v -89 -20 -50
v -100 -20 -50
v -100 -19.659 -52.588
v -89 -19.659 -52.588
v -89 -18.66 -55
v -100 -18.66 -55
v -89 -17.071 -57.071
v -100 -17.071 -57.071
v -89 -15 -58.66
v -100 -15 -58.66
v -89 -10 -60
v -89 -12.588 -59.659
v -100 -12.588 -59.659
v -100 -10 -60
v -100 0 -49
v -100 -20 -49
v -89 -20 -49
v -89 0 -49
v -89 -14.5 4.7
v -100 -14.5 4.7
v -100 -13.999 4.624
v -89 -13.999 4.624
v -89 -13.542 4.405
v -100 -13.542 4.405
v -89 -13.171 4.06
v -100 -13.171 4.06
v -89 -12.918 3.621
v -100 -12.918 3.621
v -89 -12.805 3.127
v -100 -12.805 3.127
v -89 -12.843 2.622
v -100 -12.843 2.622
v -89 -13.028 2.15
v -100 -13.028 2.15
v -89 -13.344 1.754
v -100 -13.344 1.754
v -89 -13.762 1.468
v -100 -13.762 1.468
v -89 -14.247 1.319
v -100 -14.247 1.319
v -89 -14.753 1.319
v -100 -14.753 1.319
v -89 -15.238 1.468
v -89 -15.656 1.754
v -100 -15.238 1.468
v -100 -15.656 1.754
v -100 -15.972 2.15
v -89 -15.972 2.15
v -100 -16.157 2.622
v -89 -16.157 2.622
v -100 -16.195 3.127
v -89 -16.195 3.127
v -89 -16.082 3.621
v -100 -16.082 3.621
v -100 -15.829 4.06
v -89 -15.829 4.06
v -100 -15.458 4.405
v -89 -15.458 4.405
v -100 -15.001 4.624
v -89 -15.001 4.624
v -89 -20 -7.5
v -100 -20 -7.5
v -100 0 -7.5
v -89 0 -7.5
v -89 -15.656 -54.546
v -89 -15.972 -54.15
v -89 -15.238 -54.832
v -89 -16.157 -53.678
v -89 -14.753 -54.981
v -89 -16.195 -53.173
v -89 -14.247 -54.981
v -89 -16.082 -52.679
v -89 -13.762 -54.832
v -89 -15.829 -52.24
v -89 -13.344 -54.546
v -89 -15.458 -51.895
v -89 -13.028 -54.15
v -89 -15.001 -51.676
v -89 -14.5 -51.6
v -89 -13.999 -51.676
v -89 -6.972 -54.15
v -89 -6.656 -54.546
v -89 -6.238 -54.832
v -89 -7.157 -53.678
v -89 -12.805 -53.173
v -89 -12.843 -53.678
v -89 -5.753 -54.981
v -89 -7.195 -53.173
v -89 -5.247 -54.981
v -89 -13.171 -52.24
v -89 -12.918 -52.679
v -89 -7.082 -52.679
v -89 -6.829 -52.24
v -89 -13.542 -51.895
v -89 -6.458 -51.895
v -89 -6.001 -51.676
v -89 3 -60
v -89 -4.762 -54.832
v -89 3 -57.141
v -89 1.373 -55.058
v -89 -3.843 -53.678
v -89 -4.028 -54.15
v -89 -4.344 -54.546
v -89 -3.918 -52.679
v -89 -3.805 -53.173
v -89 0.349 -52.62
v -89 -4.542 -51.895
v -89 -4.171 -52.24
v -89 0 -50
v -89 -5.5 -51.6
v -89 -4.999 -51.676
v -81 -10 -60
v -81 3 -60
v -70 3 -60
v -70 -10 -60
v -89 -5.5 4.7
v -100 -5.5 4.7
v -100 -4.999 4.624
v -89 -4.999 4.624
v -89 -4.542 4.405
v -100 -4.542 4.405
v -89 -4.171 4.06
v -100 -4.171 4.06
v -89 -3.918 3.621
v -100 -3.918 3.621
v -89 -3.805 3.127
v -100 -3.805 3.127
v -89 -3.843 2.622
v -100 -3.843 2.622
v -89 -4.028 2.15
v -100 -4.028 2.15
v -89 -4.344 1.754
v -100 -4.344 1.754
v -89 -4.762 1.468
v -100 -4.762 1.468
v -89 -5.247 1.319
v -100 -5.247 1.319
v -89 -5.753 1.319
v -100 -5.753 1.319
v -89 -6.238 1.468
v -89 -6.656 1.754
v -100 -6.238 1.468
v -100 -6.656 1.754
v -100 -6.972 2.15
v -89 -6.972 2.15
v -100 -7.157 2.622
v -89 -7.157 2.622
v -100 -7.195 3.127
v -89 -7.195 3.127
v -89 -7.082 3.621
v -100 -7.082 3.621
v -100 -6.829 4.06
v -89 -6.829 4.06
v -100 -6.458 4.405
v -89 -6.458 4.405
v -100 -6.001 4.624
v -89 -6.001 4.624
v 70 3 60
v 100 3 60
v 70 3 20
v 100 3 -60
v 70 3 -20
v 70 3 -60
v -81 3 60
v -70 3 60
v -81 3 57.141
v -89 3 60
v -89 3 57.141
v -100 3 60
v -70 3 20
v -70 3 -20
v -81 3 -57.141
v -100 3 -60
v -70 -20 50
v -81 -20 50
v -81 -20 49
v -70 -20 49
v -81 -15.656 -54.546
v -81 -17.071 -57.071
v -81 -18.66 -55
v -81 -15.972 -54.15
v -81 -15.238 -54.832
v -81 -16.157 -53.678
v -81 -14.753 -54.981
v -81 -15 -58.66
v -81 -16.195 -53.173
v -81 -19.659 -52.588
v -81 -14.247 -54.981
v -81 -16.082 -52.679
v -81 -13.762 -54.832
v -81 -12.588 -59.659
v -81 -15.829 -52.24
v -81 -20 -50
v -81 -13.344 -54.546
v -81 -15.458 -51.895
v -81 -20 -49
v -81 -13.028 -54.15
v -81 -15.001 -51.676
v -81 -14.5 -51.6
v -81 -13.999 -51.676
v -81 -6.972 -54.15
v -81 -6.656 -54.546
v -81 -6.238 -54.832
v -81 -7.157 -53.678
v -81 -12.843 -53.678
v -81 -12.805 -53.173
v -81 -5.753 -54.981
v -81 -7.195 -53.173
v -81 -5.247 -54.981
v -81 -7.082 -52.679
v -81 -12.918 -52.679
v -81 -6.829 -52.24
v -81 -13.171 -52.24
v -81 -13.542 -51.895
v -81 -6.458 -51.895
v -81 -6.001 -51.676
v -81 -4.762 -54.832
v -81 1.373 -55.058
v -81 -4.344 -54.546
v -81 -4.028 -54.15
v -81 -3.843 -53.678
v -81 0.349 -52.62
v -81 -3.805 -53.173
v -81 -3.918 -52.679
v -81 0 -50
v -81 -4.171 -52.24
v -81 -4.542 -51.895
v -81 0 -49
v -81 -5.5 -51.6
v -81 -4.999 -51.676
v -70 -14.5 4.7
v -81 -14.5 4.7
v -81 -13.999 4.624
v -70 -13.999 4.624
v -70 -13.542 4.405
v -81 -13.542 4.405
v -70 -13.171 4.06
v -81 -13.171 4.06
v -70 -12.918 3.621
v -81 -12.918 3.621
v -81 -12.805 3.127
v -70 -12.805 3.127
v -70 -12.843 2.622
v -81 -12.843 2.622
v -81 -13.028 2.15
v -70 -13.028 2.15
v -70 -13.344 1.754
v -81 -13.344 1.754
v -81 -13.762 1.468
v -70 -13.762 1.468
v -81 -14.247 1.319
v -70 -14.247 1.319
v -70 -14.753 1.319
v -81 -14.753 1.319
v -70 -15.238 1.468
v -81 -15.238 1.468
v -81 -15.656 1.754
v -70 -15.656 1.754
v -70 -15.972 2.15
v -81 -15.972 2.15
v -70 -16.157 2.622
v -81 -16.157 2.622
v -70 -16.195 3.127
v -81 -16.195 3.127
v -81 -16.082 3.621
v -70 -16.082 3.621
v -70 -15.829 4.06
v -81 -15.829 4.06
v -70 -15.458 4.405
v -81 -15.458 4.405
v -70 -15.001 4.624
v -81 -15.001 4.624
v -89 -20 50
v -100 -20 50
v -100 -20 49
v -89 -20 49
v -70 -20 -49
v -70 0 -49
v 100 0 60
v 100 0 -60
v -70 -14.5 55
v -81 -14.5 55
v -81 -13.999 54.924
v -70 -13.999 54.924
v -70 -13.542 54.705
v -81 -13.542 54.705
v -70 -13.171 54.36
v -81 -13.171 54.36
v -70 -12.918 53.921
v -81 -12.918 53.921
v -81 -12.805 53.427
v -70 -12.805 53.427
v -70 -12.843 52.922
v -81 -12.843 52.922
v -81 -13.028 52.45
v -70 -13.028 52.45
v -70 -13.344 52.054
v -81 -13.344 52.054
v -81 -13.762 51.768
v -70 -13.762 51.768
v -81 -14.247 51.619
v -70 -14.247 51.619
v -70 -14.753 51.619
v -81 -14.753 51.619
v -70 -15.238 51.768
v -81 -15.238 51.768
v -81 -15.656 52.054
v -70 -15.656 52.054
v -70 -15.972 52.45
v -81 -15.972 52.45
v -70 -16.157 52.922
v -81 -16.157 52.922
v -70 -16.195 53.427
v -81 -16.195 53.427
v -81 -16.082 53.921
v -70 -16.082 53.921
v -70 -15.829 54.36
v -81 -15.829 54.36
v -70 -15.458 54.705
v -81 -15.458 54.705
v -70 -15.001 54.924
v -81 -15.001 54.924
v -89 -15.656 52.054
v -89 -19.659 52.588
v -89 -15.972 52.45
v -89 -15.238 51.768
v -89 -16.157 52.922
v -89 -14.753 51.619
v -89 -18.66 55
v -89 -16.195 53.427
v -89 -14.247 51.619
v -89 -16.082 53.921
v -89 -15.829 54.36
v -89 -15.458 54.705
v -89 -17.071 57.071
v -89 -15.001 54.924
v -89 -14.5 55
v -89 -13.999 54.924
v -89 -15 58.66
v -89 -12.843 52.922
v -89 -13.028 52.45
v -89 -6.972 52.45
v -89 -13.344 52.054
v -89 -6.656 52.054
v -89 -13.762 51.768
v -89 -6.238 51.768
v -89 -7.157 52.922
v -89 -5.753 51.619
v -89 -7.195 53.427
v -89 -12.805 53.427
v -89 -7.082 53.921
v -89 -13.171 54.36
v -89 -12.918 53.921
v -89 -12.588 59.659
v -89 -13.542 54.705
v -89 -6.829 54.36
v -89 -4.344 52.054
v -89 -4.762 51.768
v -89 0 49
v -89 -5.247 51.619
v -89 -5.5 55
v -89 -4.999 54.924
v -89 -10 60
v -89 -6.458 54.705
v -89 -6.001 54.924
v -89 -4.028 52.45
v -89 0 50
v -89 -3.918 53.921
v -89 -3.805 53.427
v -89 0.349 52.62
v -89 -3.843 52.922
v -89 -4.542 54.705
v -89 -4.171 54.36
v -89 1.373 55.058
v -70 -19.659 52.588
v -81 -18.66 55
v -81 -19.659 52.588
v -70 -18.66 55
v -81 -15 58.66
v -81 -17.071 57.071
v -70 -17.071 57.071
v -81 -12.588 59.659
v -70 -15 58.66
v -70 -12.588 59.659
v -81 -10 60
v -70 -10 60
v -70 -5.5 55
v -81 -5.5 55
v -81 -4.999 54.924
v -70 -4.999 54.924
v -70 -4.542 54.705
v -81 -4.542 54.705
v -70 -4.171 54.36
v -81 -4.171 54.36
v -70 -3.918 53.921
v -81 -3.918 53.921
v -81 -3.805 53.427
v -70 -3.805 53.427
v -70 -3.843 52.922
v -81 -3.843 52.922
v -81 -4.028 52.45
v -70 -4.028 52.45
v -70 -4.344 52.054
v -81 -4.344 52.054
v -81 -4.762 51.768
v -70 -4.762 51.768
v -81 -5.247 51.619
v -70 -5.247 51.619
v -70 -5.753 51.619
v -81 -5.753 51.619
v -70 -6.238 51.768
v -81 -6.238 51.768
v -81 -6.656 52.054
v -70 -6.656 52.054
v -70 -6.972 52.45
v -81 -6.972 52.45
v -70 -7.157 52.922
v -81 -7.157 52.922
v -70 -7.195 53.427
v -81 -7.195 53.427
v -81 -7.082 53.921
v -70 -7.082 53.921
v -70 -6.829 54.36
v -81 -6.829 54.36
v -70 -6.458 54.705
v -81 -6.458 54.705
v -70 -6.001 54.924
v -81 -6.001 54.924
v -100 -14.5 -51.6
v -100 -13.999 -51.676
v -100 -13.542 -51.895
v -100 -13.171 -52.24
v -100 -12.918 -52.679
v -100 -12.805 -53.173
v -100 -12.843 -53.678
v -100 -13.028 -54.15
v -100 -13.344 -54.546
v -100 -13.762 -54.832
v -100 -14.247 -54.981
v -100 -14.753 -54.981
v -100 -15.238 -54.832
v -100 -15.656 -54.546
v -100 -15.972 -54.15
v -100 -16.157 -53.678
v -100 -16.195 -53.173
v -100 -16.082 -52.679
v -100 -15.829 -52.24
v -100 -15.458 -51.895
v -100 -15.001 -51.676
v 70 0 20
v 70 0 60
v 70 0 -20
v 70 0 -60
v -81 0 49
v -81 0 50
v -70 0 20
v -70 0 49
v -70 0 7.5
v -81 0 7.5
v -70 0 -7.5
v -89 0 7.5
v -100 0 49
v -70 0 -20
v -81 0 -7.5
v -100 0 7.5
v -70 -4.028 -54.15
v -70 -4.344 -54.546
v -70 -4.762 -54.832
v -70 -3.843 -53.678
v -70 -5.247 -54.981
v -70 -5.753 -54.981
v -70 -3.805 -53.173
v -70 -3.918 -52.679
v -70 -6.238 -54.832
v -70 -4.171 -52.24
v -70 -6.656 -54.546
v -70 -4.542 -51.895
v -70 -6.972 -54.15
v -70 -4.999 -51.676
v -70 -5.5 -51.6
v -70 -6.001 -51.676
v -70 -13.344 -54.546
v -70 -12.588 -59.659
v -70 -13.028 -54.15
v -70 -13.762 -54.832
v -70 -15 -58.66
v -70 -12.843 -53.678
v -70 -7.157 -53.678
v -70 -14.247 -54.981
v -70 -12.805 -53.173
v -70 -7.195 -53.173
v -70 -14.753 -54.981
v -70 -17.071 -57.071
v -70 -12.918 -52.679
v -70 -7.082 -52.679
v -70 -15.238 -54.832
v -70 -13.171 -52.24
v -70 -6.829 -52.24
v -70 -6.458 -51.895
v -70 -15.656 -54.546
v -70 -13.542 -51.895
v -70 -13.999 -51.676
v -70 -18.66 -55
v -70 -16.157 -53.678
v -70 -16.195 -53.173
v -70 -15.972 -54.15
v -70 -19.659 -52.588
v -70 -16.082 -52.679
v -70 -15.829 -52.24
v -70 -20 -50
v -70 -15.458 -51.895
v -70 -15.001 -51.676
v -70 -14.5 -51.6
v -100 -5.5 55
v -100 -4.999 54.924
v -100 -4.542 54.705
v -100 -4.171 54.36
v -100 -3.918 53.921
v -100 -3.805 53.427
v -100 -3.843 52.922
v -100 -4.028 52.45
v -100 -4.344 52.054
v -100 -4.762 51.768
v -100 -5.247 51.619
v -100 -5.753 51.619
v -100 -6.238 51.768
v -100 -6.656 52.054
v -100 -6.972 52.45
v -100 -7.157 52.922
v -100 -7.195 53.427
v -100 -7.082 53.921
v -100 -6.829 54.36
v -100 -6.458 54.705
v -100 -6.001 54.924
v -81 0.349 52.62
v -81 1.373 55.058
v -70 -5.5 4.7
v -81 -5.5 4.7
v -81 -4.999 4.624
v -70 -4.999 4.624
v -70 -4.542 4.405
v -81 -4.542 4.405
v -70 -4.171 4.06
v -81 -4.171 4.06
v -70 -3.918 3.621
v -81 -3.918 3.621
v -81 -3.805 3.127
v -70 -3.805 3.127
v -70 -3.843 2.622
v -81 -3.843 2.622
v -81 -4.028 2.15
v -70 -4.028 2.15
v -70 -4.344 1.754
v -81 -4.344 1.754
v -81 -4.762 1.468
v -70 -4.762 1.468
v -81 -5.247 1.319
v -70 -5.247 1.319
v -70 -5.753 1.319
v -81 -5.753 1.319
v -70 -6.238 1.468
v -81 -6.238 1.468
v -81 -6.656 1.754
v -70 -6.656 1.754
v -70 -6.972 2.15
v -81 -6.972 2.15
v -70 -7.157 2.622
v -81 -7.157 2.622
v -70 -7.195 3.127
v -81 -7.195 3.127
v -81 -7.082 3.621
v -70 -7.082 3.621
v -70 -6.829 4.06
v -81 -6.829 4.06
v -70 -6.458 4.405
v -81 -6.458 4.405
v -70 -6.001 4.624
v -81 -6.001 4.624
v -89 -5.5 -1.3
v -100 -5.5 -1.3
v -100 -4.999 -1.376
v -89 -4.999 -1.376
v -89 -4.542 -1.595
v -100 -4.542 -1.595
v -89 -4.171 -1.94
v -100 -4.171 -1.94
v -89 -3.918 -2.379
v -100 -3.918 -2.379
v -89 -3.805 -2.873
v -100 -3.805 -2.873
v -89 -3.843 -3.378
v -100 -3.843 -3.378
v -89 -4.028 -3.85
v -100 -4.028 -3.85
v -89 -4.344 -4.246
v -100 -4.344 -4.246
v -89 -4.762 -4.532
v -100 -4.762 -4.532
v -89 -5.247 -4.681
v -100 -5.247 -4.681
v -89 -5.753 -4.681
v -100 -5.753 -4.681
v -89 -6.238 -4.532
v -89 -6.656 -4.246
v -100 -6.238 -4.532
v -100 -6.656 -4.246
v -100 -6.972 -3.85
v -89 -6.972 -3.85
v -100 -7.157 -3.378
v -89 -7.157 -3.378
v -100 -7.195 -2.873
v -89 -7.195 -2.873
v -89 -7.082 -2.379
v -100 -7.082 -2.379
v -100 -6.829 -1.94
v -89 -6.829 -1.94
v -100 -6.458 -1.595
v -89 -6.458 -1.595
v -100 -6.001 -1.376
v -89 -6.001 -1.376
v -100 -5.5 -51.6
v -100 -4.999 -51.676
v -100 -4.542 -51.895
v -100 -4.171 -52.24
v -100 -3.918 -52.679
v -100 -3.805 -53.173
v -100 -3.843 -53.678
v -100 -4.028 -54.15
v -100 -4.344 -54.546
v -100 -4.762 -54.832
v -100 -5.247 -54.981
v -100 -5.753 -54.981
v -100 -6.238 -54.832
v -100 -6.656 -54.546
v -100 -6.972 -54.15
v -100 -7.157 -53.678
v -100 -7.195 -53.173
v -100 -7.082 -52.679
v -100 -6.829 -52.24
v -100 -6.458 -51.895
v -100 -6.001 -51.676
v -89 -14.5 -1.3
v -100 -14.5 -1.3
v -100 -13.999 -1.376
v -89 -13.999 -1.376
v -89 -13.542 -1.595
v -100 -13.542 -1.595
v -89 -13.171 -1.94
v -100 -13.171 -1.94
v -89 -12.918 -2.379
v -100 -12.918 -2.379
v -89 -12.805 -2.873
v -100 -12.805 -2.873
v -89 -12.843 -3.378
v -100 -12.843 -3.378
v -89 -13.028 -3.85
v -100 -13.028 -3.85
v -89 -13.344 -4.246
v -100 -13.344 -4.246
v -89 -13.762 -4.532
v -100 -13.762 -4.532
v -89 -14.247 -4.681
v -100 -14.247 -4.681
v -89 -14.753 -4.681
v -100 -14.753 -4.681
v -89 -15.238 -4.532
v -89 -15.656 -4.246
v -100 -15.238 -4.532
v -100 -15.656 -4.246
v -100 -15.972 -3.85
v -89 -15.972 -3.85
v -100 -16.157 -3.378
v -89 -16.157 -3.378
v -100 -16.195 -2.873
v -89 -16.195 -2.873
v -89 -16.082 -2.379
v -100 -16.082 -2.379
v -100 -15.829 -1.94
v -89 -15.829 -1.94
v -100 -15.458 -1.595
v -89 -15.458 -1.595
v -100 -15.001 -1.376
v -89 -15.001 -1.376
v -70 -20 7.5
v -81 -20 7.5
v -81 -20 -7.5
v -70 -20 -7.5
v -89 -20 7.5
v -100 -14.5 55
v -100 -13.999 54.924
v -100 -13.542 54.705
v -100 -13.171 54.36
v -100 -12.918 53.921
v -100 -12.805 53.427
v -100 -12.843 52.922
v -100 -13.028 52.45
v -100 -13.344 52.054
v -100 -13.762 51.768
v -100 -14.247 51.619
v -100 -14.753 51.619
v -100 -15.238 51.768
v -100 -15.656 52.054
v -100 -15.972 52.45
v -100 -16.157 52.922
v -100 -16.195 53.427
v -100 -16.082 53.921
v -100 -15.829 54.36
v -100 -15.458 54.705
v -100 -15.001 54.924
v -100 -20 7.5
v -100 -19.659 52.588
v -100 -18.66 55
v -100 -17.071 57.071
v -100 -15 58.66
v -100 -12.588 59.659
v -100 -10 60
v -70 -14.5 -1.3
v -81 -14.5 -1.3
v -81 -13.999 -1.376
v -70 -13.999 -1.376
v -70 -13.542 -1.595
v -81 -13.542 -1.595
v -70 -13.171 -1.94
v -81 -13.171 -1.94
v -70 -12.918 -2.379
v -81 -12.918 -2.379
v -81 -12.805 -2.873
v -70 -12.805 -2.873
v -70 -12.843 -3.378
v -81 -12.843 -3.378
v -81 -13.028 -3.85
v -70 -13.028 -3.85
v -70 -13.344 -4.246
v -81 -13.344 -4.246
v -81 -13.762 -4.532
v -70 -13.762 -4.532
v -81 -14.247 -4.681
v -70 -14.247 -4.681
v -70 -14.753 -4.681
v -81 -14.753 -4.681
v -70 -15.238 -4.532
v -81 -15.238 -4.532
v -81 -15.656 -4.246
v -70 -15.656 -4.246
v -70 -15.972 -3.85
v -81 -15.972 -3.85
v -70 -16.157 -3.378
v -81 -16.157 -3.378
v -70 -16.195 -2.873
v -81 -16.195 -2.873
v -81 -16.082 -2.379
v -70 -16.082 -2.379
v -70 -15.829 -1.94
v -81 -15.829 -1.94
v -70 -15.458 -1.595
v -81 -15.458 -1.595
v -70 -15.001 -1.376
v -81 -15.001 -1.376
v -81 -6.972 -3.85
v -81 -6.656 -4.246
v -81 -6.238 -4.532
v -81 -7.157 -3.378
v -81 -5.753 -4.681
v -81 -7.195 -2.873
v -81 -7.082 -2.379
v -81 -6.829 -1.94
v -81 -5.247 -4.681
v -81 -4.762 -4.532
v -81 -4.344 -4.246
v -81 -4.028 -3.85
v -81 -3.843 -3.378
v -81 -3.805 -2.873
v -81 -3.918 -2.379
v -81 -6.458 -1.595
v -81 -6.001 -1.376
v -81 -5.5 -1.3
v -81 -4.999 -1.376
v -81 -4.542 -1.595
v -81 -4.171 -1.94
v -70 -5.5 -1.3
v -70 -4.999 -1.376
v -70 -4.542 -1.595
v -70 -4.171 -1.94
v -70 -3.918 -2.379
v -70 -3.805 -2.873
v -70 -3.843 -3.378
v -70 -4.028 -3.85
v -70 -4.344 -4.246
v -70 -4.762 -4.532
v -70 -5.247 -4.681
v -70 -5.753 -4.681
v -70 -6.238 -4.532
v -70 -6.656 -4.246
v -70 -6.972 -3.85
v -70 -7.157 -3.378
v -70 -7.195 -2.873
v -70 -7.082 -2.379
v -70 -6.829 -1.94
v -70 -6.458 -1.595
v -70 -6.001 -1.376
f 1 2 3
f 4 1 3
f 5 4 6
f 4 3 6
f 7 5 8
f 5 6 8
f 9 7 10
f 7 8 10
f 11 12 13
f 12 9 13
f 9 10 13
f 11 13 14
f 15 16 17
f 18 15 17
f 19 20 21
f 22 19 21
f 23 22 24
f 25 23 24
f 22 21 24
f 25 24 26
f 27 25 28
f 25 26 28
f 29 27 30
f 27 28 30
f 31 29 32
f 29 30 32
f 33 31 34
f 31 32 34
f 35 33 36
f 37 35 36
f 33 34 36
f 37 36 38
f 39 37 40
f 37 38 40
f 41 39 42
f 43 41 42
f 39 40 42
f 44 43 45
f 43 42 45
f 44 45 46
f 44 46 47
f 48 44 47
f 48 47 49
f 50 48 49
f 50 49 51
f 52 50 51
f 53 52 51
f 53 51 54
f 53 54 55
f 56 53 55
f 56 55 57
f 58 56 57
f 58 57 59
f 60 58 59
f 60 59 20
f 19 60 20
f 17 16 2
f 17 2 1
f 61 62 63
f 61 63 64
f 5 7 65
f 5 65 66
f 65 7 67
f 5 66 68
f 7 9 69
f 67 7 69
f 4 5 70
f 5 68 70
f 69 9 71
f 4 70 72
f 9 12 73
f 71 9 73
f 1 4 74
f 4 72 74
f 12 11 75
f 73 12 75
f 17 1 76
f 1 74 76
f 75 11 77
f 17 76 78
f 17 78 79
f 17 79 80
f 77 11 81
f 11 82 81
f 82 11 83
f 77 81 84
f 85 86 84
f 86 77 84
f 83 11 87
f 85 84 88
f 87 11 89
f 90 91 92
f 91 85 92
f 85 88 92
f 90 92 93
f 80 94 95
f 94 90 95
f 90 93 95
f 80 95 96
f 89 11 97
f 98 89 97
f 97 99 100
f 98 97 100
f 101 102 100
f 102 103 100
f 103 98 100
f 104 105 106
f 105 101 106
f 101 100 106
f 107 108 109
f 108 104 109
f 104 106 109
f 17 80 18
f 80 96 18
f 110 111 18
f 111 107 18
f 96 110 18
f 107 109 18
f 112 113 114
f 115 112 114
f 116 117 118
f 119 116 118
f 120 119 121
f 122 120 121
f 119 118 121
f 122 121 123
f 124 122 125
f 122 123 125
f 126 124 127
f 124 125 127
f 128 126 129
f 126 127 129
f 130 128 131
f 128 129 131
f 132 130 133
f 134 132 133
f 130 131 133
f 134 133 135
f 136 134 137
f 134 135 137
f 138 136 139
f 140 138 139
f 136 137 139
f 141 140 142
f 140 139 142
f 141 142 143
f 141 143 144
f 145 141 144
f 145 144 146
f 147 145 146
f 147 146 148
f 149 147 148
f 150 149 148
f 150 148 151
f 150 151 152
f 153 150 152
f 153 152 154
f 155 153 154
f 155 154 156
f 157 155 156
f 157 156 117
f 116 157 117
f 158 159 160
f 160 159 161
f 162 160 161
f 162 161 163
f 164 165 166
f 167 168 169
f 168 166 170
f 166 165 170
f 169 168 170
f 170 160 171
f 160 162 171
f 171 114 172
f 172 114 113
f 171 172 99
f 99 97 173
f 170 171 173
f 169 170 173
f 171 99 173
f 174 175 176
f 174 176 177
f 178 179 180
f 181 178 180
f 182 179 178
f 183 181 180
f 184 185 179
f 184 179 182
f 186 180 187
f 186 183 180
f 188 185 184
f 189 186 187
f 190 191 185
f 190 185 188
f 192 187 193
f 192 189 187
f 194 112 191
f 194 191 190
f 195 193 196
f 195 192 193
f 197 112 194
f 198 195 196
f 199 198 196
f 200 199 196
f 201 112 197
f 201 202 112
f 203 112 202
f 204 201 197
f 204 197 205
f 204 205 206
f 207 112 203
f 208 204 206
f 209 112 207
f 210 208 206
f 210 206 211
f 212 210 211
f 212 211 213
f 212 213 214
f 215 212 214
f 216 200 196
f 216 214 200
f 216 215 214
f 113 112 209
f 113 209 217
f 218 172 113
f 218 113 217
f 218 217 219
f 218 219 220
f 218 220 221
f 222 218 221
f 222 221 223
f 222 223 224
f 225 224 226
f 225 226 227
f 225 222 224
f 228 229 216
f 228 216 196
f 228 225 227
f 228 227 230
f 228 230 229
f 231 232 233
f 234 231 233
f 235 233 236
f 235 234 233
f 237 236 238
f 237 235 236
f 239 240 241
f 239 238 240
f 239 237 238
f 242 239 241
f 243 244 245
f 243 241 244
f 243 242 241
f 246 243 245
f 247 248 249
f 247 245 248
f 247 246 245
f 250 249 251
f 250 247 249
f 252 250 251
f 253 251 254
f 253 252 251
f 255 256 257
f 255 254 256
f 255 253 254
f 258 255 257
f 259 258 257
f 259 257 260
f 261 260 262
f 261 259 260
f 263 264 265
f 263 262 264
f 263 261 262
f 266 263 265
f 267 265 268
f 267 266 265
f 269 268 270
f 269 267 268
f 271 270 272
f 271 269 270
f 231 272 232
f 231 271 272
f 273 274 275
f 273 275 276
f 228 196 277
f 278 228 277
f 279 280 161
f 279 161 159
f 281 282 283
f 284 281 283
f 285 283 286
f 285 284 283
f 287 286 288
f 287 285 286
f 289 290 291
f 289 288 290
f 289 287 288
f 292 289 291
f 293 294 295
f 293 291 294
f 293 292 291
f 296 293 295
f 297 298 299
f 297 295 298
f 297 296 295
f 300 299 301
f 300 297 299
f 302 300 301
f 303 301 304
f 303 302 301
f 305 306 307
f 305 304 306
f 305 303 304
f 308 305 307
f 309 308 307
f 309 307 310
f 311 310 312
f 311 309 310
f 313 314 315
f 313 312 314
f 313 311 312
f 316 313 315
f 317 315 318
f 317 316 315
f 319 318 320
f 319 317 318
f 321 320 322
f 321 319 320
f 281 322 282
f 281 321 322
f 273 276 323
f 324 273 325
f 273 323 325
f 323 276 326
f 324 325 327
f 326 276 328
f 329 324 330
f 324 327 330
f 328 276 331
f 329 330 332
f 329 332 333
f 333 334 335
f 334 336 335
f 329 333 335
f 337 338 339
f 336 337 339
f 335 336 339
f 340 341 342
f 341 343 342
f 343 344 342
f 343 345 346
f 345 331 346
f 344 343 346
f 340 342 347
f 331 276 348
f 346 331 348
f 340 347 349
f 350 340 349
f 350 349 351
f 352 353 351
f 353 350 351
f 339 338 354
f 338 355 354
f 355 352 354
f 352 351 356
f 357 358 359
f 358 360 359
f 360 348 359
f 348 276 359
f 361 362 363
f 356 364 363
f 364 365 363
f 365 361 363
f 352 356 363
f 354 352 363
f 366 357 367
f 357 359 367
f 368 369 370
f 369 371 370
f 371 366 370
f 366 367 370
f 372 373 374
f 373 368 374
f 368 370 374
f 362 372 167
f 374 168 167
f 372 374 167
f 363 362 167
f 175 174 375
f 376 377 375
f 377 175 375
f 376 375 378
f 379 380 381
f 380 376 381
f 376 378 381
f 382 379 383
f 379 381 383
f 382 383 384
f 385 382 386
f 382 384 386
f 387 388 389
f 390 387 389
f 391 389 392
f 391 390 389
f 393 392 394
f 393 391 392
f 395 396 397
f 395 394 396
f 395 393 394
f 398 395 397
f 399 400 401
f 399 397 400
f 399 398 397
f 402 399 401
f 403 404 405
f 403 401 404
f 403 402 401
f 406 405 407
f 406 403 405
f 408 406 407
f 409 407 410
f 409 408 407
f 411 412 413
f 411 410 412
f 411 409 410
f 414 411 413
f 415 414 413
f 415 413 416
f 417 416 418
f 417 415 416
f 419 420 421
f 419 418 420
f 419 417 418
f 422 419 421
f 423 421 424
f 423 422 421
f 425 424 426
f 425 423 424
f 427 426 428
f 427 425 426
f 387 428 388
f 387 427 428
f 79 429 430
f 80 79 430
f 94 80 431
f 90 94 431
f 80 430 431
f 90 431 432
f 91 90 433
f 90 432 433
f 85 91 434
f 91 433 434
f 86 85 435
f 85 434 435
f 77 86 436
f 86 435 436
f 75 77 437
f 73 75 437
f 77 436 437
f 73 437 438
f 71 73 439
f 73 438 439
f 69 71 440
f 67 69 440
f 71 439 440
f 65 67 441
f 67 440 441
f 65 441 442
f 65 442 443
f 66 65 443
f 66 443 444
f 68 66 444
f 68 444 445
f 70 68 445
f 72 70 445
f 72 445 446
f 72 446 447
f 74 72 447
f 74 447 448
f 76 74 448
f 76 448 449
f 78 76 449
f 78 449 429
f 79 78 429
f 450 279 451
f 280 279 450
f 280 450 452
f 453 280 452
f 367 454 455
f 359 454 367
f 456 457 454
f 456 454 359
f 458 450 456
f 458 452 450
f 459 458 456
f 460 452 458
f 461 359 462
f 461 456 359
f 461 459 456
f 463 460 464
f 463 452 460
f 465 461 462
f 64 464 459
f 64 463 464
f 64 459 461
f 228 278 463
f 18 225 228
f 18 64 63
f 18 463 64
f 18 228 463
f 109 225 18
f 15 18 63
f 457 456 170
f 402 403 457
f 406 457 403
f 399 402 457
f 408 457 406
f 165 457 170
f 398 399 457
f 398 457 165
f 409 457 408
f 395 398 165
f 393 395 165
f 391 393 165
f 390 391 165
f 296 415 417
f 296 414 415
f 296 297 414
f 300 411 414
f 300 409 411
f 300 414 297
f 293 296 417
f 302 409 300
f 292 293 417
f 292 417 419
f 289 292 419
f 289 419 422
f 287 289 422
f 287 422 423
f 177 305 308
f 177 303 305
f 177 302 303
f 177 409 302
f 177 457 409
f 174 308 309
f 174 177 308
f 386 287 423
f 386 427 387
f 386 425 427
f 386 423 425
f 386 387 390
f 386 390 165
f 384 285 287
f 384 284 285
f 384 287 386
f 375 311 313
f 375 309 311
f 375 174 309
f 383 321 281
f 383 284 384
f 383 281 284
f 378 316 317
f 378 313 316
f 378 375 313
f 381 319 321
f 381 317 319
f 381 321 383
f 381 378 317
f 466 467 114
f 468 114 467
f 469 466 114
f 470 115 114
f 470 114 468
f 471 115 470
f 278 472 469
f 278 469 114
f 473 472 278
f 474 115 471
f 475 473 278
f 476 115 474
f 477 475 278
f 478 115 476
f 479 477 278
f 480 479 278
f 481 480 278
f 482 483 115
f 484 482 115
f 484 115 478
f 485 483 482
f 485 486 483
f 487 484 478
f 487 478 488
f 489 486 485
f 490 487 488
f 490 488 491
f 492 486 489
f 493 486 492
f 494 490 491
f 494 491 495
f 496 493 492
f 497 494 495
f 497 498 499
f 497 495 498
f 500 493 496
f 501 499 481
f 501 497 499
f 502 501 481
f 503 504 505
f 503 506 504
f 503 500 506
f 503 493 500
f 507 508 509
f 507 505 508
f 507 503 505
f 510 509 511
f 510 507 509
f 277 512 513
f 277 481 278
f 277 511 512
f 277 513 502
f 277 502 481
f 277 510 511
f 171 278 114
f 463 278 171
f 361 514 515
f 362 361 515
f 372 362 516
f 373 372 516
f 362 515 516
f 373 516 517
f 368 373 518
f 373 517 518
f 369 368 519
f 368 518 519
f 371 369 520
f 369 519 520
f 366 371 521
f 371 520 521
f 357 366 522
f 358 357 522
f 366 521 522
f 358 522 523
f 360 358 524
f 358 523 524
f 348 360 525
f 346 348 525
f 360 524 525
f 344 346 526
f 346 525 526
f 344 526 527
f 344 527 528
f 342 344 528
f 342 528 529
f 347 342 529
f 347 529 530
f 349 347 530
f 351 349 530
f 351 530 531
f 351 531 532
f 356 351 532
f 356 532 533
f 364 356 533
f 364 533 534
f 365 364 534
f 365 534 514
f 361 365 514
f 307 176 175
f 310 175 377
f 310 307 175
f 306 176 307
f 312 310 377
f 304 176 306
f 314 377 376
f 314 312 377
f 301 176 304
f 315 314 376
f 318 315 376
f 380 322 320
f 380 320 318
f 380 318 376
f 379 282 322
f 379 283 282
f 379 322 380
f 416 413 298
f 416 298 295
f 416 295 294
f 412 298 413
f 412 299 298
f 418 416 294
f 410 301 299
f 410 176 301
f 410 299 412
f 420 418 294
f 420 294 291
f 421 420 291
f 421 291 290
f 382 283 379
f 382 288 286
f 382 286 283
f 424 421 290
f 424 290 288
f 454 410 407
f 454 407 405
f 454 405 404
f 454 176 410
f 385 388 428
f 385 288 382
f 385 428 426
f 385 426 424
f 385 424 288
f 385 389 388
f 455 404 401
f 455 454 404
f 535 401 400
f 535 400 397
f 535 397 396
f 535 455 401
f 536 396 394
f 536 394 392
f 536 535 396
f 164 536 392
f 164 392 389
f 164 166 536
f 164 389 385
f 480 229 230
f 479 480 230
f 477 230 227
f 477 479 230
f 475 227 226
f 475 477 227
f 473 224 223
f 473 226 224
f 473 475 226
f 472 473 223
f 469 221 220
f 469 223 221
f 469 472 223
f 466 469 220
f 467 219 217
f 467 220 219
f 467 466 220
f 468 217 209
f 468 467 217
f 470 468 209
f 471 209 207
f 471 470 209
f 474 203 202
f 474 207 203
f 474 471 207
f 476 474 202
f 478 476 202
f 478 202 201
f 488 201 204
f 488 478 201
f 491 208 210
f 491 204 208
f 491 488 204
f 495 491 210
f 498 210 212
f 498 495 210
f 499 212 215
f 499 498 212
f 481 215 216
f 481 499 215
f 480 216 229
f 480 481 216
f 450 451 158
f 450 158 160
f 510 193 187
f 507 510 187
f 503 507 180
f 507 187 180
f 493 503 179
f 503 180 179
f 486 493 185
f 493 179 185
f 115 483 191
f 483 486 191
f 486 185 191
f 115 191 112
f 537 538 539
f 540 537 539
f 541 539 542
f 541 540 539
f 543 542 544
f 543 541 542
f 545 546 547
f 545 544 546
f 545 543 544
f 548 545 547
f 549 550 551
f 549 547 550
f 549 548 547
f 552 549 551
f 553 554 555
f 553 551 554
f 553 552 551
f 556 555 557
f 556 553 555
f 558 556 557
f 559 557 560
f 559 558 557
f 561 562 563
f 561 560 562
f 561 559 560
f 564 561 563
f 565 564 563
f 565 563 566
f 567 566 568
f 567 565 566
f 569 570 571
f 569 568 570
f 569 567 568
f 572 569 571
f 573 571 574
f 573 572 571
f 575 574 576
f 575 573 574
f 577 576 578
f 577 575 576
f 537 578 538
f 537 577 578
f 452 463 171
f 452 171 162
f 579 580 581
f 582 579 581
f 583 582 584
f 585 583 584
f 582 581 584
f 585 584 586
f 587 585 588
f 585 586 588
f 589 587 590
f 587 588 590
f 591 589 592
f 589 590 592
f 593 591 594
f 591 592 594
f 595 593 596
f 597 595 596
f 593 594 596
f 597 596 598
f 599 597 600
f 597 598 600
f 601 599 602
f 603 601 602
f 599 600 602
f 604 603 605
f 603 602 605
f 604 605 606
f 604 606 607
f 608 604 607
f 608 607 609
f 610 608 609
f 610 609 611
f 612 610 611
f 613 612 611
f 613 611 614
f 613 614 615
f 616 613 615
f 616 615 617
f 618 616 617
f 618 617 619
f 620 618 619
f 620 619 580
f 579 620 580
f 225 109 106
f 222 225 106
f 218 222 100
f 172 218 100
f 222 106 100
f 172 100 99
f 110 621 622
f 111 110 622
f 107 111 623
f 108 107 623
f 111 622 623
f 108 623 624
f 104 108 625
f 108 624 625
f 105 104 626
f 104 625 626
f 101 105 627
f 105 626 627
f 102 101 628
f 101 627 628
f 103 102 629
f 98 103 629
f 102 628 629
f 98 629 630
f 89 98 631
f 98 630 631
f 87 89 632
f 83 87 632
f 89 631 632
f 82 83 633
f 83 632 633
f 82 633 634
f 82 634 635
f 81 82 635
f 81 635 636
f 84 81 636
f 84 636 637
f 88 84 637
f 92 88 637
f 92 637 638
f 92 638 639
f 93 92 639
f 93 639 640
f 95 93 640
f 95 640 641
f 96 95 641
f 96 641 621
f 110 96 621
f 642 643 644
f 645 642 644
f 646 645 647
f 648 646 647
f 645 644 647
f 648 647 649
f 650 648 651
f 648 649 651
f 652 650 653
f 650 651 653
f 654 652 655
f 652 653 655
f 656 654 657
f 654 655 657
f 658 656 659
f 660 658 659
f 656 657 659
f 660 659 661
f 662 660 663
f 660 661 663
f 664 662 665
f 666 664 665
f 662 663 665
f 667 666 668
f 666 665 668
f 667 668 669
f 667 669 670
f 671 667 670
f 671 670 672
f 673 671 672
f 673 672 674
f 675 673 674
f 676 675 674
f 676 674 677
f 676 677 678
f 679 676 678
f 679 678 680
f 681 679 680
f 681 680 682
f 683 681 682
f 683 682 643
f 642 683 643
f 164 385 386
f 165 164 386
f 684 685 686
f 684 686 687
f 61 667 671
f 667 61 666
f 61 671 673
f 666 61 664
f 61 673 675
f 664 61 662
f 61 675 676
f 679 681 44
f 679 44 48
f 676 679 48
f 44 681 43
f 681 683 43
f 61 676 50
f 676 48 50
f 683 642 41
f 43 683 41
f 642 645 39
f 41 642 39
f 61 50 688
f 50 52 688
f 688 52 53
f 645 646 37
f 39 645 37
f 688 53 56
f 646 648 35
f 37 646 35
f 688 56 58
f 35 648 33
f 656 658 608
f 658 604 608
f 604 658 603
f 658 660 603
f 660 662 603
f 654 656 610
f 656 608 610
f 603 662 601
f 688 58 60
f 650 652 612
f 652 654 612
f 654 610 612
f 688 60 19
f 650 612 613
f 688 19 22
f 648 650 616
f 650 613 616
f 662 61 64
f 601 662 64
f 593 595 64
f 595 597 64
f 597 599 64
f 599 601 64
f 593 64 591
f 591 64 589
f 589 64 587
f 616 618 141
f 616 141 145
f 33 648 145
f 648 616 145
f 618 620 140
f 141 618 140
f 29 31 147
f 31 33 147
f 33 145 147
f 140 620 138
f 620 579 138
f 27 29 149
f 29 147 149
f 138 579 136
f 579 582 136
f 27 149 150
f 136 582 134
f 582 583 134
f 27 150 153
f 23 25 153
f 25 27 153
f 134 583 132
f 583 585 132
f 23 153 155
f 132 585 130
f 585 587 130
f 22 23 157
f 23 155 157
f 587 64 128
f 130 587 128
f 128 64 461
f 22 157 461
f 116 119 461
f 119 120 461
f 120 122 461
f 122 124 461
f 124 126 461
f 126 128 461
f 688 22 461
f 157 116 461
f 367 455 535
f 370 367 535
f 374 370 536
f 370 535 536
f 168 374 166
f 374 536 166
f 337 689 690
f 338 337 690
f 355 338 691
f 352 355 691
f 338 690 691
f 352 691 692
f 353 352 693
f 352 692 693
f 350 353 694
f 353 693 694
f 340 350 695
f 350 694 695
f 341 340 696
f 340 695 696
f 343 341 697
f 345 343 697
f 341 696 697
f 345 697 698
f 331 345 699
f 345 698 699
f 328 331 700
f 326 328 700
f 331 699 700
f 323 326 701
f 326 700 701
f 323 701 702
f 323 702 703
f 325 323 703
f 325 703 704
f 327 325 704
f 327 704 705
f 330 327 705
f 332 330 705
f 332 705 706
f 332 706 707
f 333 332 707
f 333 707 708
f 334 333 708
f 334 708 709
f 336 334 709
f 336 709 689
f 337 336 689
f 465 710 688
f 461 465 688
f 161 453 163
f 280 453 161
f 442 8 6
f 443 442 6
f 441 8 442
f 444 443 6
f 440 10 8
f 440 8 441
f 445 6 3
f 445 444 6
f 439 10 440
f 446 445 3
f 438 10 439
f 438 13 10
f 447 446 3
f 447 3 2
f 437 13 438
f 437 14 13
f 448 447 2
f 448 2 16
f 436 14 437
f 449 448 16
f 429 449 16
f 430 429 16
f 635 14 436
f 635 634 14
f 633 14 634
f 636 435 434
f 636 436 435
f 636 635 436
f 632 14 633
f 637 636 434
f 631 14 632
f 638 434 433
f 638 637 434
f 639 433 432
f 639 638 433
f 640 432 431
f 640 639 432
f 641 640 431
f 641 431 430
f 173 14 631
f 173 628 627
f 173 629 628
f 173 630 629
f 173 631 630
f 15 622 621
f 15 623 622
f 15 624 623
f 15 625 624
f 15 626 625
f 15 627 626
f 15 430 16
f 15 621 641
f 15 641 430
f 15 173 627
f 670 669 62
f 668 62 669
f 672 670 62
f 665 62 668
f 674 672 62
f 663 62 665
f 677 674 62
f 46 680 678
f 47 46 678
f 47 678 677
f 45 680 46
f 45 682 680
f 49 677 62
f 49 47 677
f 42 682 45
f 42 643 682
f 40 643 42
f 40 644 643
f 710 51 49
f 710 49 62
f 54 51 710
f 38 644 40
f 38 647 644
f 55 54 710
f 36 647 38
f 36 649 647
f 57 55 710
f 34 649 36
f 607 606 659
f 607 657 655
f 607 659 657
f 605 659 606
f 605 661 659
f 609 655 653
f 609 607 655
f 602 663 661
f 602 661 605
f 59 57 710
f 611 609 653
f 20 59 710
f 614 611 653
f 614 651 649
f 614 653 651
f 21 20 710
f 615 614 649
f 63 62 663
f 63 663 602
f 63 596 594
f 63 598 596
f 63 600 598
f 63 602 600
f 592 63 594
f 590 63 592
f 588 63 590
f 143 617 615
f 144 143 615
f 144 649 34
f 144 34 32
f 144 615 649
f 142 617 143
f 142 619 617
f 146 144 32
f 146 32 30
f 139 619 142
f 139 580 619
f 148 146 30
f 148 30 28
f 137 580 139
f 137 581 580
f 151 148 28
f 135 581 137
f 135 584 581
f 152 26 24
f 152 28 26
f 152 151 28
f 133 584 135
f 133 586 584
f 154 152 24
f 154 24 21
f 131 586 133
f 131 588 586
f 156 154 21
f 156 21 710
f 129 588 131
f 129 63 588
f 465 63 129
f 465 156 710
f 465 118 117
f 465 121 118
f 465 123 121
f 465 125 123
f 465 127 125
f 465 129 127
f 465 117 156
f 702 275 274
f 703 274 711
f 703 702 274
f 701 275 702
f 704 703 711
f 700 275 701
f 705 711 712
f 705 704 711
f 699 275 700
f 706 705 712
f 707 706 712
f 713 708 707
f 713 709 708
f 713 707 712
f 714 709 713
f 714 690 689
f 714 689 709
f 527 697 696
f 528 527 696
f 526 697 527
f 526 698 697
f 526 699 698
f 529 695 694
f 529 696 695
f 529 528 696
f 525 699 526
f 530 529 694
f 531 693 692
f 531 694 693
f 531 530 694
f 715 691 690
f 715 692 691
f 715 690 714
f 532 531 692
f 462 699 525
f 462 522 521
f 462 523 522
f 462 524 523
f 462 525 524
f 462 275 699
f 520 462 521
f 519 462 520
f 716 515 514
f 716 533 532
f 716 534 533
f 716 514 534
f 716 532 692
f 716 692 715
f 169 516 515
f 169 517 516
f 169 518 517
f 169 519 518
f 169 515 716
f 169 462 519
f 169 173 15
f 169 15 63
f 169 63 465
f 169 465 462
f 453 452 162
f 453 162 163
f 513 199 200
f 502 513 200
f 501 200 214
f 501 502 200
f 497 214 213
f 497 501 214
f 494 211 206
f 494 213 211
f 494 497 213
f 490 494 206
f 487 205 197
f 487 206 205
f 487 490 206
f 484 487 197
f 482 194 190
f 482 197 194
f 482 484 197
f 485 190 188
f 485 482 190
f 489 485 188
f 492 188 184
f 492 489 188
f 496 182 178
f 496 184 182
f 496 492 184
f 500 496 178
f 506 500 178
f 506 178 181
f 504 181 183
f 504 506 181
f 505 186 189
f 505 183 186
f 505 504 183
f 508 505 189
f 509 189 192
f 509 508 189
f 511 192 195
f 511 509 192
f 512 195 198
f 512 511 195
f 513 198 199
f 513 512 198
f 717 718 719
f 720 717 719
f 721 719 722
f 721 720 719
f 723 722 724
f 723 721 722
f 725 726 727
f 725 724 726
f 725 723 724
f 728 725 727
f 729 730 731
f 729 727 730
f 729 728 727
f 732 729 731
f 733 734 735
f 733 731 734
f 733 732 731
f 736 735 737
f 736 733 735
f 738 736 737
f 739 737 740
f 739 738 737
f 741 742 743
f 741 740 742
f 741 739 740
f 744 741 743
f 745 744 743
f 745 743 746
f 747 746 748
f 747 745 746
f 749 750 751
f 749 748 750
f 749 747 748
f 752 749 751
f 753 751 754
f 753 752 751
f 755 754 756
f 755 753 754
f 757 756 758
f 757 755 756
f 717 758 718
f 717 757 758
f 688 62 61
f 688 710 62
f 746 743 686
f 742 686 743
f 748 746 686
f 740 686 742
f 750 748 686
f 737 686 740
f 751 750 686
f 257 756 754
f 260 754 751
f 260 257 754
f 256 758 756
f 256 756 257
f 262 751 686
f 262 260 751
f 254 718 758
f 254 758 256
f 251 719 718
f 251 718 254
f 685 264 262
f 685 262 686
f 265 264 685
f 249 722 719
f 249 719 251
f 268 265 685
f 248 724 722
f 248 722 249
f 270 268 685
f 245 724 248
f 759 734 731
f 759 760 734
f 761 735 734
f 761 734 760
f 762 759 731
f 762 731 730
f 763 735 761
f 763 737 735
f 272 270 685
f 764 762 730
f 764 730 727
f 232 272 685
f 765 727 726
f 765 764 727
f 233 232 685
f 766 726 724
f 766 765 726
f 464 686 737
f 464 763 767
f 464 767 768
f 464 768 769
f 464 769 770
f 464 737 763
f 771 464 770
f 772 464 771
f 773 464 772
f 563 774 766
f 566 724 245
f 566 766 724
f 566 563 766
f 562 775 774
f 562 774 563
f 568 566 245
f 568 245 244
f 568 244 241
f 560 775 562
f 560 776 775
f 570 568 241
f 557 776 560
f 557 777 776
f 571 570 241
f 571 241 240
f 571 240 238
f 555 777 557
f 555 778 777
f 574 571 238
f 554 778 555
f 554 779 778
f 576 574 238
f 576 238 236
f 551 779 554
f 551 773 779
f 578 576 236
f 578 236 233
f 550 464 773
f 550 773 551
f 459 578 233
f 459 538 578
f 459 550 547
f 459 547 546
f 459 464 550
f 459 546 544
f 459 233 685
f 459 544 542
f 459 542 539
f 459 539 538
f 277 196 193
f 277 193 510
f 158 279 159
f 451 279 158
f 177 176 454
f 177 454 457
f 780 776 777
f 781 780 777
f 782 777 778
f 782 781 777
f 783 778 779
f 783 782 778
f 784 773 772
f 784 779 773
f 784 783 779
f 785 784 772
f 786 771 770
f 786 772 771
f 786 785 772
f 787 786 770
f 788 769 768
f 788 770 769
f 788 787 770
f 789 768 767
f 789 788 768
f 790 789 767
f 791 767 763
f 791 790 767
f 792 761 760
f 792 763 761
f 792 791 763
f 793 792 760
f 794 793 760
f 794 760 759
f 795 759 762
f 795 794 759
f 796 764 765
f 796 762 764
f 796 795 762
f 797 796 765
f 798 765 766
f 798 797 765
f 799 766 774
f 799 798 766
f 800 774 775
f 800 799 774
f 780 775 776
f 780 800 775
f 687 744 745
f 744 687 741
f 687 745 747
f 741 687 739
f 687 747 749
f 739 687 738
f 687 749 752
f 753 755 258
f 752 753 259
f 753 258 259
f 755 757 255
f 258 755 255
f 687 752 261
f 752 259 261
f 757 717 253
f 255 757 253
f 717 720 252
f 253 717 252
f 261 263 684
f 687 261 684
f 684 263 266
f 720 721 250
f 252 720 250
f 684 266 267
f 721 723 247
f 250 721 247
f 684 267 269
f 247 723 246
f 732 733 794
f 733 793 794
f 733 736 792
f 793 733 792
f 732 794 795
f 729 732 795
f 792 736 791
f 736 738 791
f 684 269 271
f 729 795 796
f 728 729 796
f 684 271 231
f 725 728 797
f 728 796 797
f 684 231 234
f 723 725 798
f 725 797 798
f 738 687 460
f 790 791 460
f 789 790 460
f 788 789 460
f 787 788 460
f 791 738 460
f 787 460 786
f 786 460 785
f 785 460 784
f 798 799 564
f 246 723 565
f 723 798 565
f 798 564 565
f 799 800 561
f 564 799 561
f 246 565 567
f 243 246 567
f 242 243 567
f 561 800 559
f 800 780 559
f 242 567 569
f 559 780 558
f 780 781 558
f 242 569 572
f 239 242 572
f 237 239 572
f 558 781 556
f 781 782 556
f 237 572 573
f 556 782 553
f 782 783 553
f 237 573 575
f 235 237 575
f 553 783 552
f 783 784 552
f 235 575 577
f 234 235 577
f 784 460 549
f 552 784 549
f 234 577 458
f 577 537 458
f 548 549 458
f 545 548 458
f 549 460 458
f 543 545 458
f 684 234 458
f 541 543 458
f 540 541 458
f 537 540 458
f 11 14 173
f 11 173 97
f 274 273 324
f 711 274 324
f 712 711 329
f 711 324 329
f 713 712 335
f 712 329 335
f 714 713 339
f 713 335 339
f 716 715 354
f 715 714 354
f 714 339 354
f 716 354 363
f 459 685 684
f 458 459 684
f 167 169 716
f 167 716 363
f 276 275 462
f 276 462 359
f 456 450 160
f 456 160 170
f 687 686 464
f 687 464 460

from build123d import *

# Parameters (mm, degrees)
EXTRUDE_1_DEPTH         = 3
SKETCH_3_W              = 11
SKETCH_3_H              = 7.5
SKETCH_3_H_2            = 11
SKETCH_3_H_3            = 15
EXTRUDE_3_DEPTH         = 20
HOLE_WIZARD_M3_1_REACH  = 211.762
HOLE_WIZARD_M3_1_BORE_R = 1.7
FILLET_1_R              = 10


with BuildPart() as part:
    # 스케치1 → 보스-돌출1 (new body)
    with BuildSketch(Plane(origin=(0, 0, 0), x_dir=(1, 0, 0), z_dir=(0, 1, 0))):
        Polygon((-100, 60), (-70, 60), (-70, 20), (70, 20), (70, 60), (100, 60), (100, -60), (70, -60), (70, -20), (-70, -20), (-70, -60), (-100, -60), align=None)
    extrude(amount=EXTRUDE_1_DEPTH)

    # 스케치3 → 보스-돌출3 (add)
    with BuildSketch(Plane.XZ):
        with Locations((-94.5, -3.75)):
            Rectangle(SKETCH_3_W, SKETCH_3_H)
        with Locations((-94.5, 3.75)):
            Rectangle(SKETCH_3_W, SKETCH_3_H)
        with Locations((-94.5, 54.5)):
            Rectangle(SKETCH_3_W, SKETCH_3_H_2)
        with Locations((-94.5, -54.5)):
            Rectangle(SKETCH_3_W, SKETCH_3_H_2)
        with Locations((-75.5, 54.5)):
            Rectangle(SKETCH_3_W, SKETCH_3_H_2)
        with Locations((-75.5, -54.5)):
            Rectangle(SKETCH_3_W, SKETCH_3_H_2)
        with Locations((-75.5, 0)):
            Rectangle(SKETCH_3_W, SKETCH_3_H_3)
    extrude(amount=EXTRUDE_3_DEPTH)

    # M3 여유 구멍1 bore → M3 여유 구멍1 (cut, up to next)
    with BuildSketch(Plane.ZY.offset(100), mode=Mode.PRIVATE) as hole_wizard_m3_1_sk1:
        with Locations((-3, -5.5)):
            Circle(HOLE_WIZARD_M3_1_BORE_R)
    hole_wizard_m3_1_tool1 = extrude(hole_wizard_m3_1_sk1.sketch, amount=-HOLE_WIZARD_M3_1_REACH, mode=Mode.PRIVATE) & part.part
    # M3 여유 구멍1 bore → M3 여유 구멍1 (cut, up to next)
    with BuildSketch(Plane.ZY.offset(100), mode=Mode.PRIVATE) as hole_wizard_m3_1_sk2:
        with Locations((-3, -14.5)):
            Circle(HOLE_WIZARD_M3_1_BORE_R)
    hole_wizard_m3_1_tool2 = extrude(hole_wizard_m3_1_sk2.sketch, amount=-HOLE_WIZARD_M3_1_REACH, mode=Mode.PRIVATE) & part.part
    # M3 여유 구멍1 bore → M3 여유 구멍1 (cut, up to next)
    with BuildSketch(Plane.ZY.offset(100), mode=Mode.PRIVATE) as hole_wizard_m3_1_sk3:
        with Locations((-53.3, -5.5)):
            Circle(HOLE_WIZARD_M3_1_BORE_R)
    hole_wizard_m3_1_tool3 = extrude(hole_wizard_m3_1_sk3.sketch, amount=-HOLE_WIZARD_M3_1_REACH, mode=Mode.PRIVATE) & part.part
    # M3 여유 구멍1 bore → M3 여유 구멍1 (cut, up to next)
    with BuildSketch(Plane.ZY.offset(100), mode=Mode.PRIVATE) as hole_wizard_m3_1_sk4:
        with Locations((-53.3, -14.5)):
            Circle(HOLE_WIZARD_M3_1_BORE_R)
    hole_wizard_m3_1_tool4 = extrude(hole_wizard_m3_1_sk4.sketch, amount=-HOLE_WIZARD_M3_1_REACH, mode=Mode.PRIVATE) & part.part
    # M3 여유 구멍1 bore → M3 여유 구멍1 (cut, up to next)
    with BuildSketch(Plane.ZY.offset(100), mode=Mode.PRIVATE) as hole_wizard_m3_1_sk5:
        with Locations((53.3, -5.5)):
            Circle(HOLE_WIZARD_M3_1_BORE_R)
    hole_wizard_m3_1_tool5 = extrude(hole_wizard_m3_1_sk5.sketch, amount=-HOLE_WIZARD_M3_1_REACH, mode=Mode.PRIVATE) & part.part
    # M3 여유 구멍1 bore → M3 여유 구멍1 (cut, up to next)
    with BuildSketch(Plane.ZY.offset(100), mode=Mode.PRIVATE) as hole_wizard_m3_1_sk6:
        with Locations((53.3, -14.5)):
            Circle(HOLE_WIZARD_M3_1_BORE_R)
    hole_wizard_m3_1_tool6 = extrude(hole_wizard_m3_1_sk6.sketch, amount=-HOLE_WIZARD_M3_1_REACH, mode=Mode.PRIVATE) & part.part
    # M3 여유 구멍1 bore → M3 여유 구멍1 (cut, up to next)
    with BuildSketch(Plane.ZY.offset(100), mode=Mode.PRIVATE) as hole_wizard_m3_1_sk7:
        with Locations((3, -14.5)):
            Circle(HOLE_WIZARD_M3_1_BORE_R)
    hole_wizard_m3_1_tool7 = extrude(hole_wizard_m3_1_sk7.sketch, amount=-HOLE_WIZARD_M3_1_REACH, mode=Mode.PRIVATE) & part.part
    # M3 여유 구멍1 bore → M3 여유 구멍1 (cut, up to next)
    with BuildSketch(Plane.ZY.offset(100), mode=Mode.PRIVATE) as hole_wizard_m3_1_sk8:
        with Locations((3, -5.5)):
            Circle(HOLE_WIZARD_M3_1_BORE_R)
    hole_wizard_m3_1_tool8 = extrude(hole_wizard_m3_1_sk8.sketch, amount=-HOLE_WIZARD_M3_1_REACH, mode=Mode.PRIVATE) & part.part
    hole_wizard_m3_1_1 = hole_wizard_m3_1_tool1.solids().sort_by_distance((-100, -5.5, -3))[0]
    add(hole_wizard_m3_1_1, mode=Mode.SUBTRACT)
    hole_wizard_m3_1_2 = hole_wizard_m3_1_tool2.solids().sort_by_distance((-100, -14.5, -3))[0]
    add(hole_wizard_m3_1_2, mode=Mode.SUBTRACT)
    hole_wizard_m3_1_3 = hole_wizard_m3_1_tool3.solids().sort_by_distance((-100, -5.5, -53.3))[0]
    add(hole_wizard_m3_1_3, mode=Mode.SUBTRACT)
    hole_wizard_m3_1_4 = hole_wizard_m3_1_tool4.solids().sort_by_distance((-100, -14.5, -53.3))[0]
    add(hole_wizard_m3_1_4, mode=Mode.SUBTRACT)
    hole_wizard_m3_1_5 = hole_wizard_m3_1_tool5.solids().sort_by_distance((-100, -5.5, 53.3))[0]
    add(hole_wizard_m3_1_5, mode=Mode.SUBTRACT)
    hole_wizard_m3_1_6 = hole_wizard_m3_1_tool6.solids().sort_by_distance((-100, -14.5, 53.3))[0]
    add(hole_wizard_m3_1_6, mode=Mode.SUBTRACT)
    hole_wizard_m3_1_7 = hole_wizard_m3_1_tool7.solids().sort_by_distance((-100, -14.5, 3))[0]
    add(hole_wizard_m3_1_7, mode=Mode.SUBTRACT)
    hole_wizard_m3_1_8 = hole_wizard_m3_1_tool8.solids().sort_by_distance((-100, -5.5, 3))[0]
    add(hole_wizard_m3_1_8, mode=Mode.SUBTRACT)
    hole_wizard_m3_1 = hole_wizard_m3_1_1 + hole_wizard_m3_1_2 + hole_wizard_m3_1_3 + hole_wizard_m3_1_4 + hole_wizard_m3_1_5 + hole_wizard_m3_1_6 + hole_wizard_m3_1_7 + hole_wizard_m3_1_8  # M3 여유 구멍1 as one shape, for the pattern or mirror that repeats it

    # 대칭 복사1: M3 여유 구멍1 mirrored; each copy of M3 여유 구멍1 runs up to whatever stops it at its own place
    mirror_1_before = part.part  # the part as the pattern finds it: every copy runs up to it
    mirror_1_hole_wizard_m3_1_long1 = extrude(hole_wizard_m3_1_sk1.sketch, amount=-HOLE_WIZARD_M3_1_REACH, mode=Mode.PRIVATE)
    mirror_1_hole_wizard_m3_1_long2 = extrude(hole_wizard_m3_1_sk2.sketch, amount=-HOLE_WIZARD_M3_1_REACH, mode=Mode.PRIVATE)
    mirror_1_hole_wizard_m3_1_long3 = extrude(hole_wizard_m3_1_sk3.sketch, amount=-HOLE_WIZARD_M3_1_REACH, mode=Mode.PRIVATE)
    mirror_1_hole_wizard_m3_1_long4 = extrude(hole_wizard_m3_1_sk4.sketch, amount=-HOLE_WIZARD_M3_1_REACH, mode=Mode.PRIVATE)
    mirror_1_hole_wizard_m3_1_long5 = extrude(hole_wizard_m3_1_sk5.sketch, amount=-HOLE_WIZARD_M3_1_REACH, mode=Mode.PRIVATE)
    mirror_1_hole_wizard_m3_1_long6 = extrude(hole_wizard_m3_1_sk6.sketch, amount=-HOLE_WIZARD_M3_1_REACH, mode=Mode.PRIVATE)
    mirror_1_hole_wizard_m3_1_long7 = extrude(hole_wizard_m3_1_sk7.sketch, amount=-HOLE_WIZARD_M3_1_REACH, mode=Mode.PRIVATE)
    mirror_1_hole_wizard_m3_1_long8 = extrude(hole_wizard_m3_1_sk8.sketch, amount=-HOLE_WIZARD_M3_1_REACH, mode=Mode.PRIVATE)
    mirror_1_hole_wizard_m3_1_tool1_1 = mirror_1_hole_wizard_m3_1_long1.mirror(Plane(origin=(0, 0, 0), x_dir=(0, 0, 1), z_dir=(1, 0, 0))) & mirror_1_before
    add(mirror_1_hole_wizard_m3_1_tool1_1.solids().sort_by_distance((100, -5.5, -3))[0], mode=Mode.SUBTRACT)
    mirror_1_hole_wizard_m3_1_tool2_1 = mirror_1_hole_wizard_m3_1_long2.mirror(Plane(origin=(0, 0, 0), x_dir=(0, 0, 1), z_dir=(1, 0, 0))) & mirror_1_before
    add(mirror_1_hole_wizard_m3_1_tool2_1.solids().sort_by_distance((100, -14.5, -3))[0], mode=Mode.SUBTRACT)
    mirror_1_hole_wizard_m3_1_tool3_1 = mirror_1_hole_wizard_m3_1_long3.mirror(Plane(origin=(0, 0, 0), x_dir=(0, 0, 1), z_dir=(1, 0, 0))) & mirror_1_before
    add(mirror_1_hole_wizard_m3_1_tool3_1.solids().sort_by_distance((100, -5.5, -53.3))[0], mode=Mode.SUBTRACT)
    mirror_1_hole_wizard_m3_1_tool4_1 = mirror_1_hole_wizard_m3_1_long4.mirror(Plane(origin=(0, 0, 0), x_dir=(0, 0, 1), z_dir=(1, 0, 0))) & mirror_1_before
    add(mirror_1_hole_wizard_m3_1_tool4_1.solids().sort_by_distance((100, -14.5, -53.3))[0], mode=Mode.SUBTRACT)
    mirror_1_hole_wizard_m3_1_tool5_1 = mirror_1_hole_wizard_m3_1_long5.mirror(Plane(origin=(0, 0, 0), x_dir=(0, 0, 1), z_dir=(1, 0, 0))) & mirror_1_before
    add(mirror_1_hole_wizard_m3_1_tool5_1.solids().sort_by_distance((100, -5.5, 53.3))[0], mode=Mode.SUBTRACT)
    mirror_1_hole_wizard_m3_1_tool6_1 = mirror_1_hole_wizard_m3_1_long6.mirror(Plane(origin=(0, 0, 0), x_dir=(0, 0, 1), z_dir=(1, 0, 0))) & mirror_1_before
    add(mirror_1_hole_wizard_m3_1_tool6_1.solids().sort_by_distance((100, -14.5, 53.3))[0], mode=Mode.SUBTRACT)
    mirror_1_hole_wizard_m3_1_tool7_1 = mirror_1_hole_wizard_m3_1_long7.mirror(Plane(origin=(0, 0, 0), x_dir=(0, 0, 1), z_dir=(1, 0, 0))) & mirror_1_before
    add(mirror_1_hole_wizard_m3_1_tool7_1.solids().sort_by_distance((100, -14.5, 3))[0], mode=Mode.SUBTRACT)
    mirror_1_hole_wizard_m3_1_tool8_1 = mirror_1_hole_wizard_m3_1_long8.mirror(Plane(origin=(0, 0, 0), x_dir=(0, 0, 1), z_dir=(1, 0, 0))) & mirror_1_before
    add(mirror_1_hole_wizard_m3_1_tool8_1.solids().sort_by_distance((100, -5.5, 3))[0], mode=Mode.SUBTRACT)

    # 필렛1
    # the kernel refuses this fillet: 10 mm, written as the material it takes off along each edge
    with BuildSketch(Plane(origin=(-81, 0, 60), x_dir=(0, 0, -1), z_dir=(-1, 0, 0))) as fillet_1_piece_1:
        with BuildLine():
            CenterArc((FILLET_1_R, -FILLET_1_R), FILLET_1_R, 90, 90)
            Line((0, -FILLET_1_R), (0, 0))
            Line((0, 0), (FILLET_1_R, 0))
        make_face()
    extrude(amount=8, mode=Mode.SUBTRACT)
    with BuildSketch(Plane(origin=(-64, -20, 60), x_dir=(0, 1, 0), z_dir=(-1, 0, 0)), Plane(origin=(-125, -20, -60), x_dir=(0, 1, 0), z_dir=(1, 0, 0)), Plane(origin=(-106, -20, -60), x_dir=(0, 1, 0), z_dir=(1, 0, 0))) as fillet_1_piece_2:
        with BuildLine():
            CenterArc((FILLET_1_R, FILLET_1_R), FILLET_1_R, 180, 90)
            Line((0, FILLET_1_R), (0, 0))
            Line((0, 0), (FILLET_1_R, 0))
        make_face()
    extrude(amount=61, mode=Mode.SUBTRACT)
    with BuildSketch(Plane(origin=(-106, -20, 60), x_dir=(0, 1, 0), z_dir=(1, 0, 0))) as fillet_1_piece_3:
        with BuildLine():
            CenterArc((FILLET_1_R, -FILLET_1_R), FILLET_1_R, 90, 90)
            Line((0, -FILLET_1_R), (0, 0))
            Line((0, 0), (FILLET_1_R, 0))
        make_face()
    extrude(amount=61, mode=Mode.SUBTRACT)
    with BuildSketch(Plane(origin=(-89, 0, -60), x_dir=(0, 1, 0), z_dir=(1, 0, 0))) as fillet_1_piece_4:
        with BuildLine():
            CenterArc((FILLET_1_R, FILLET_1_R), FILLET_1_R, 180, 90)
            Line((0, FILLET_1_R), (0, 0))
            Line((0, 0), (FILLET_1_R, 0))
        make_face()
    extrude(amount=8, mode=Mode.SUBTRACT)


solid = part.part
